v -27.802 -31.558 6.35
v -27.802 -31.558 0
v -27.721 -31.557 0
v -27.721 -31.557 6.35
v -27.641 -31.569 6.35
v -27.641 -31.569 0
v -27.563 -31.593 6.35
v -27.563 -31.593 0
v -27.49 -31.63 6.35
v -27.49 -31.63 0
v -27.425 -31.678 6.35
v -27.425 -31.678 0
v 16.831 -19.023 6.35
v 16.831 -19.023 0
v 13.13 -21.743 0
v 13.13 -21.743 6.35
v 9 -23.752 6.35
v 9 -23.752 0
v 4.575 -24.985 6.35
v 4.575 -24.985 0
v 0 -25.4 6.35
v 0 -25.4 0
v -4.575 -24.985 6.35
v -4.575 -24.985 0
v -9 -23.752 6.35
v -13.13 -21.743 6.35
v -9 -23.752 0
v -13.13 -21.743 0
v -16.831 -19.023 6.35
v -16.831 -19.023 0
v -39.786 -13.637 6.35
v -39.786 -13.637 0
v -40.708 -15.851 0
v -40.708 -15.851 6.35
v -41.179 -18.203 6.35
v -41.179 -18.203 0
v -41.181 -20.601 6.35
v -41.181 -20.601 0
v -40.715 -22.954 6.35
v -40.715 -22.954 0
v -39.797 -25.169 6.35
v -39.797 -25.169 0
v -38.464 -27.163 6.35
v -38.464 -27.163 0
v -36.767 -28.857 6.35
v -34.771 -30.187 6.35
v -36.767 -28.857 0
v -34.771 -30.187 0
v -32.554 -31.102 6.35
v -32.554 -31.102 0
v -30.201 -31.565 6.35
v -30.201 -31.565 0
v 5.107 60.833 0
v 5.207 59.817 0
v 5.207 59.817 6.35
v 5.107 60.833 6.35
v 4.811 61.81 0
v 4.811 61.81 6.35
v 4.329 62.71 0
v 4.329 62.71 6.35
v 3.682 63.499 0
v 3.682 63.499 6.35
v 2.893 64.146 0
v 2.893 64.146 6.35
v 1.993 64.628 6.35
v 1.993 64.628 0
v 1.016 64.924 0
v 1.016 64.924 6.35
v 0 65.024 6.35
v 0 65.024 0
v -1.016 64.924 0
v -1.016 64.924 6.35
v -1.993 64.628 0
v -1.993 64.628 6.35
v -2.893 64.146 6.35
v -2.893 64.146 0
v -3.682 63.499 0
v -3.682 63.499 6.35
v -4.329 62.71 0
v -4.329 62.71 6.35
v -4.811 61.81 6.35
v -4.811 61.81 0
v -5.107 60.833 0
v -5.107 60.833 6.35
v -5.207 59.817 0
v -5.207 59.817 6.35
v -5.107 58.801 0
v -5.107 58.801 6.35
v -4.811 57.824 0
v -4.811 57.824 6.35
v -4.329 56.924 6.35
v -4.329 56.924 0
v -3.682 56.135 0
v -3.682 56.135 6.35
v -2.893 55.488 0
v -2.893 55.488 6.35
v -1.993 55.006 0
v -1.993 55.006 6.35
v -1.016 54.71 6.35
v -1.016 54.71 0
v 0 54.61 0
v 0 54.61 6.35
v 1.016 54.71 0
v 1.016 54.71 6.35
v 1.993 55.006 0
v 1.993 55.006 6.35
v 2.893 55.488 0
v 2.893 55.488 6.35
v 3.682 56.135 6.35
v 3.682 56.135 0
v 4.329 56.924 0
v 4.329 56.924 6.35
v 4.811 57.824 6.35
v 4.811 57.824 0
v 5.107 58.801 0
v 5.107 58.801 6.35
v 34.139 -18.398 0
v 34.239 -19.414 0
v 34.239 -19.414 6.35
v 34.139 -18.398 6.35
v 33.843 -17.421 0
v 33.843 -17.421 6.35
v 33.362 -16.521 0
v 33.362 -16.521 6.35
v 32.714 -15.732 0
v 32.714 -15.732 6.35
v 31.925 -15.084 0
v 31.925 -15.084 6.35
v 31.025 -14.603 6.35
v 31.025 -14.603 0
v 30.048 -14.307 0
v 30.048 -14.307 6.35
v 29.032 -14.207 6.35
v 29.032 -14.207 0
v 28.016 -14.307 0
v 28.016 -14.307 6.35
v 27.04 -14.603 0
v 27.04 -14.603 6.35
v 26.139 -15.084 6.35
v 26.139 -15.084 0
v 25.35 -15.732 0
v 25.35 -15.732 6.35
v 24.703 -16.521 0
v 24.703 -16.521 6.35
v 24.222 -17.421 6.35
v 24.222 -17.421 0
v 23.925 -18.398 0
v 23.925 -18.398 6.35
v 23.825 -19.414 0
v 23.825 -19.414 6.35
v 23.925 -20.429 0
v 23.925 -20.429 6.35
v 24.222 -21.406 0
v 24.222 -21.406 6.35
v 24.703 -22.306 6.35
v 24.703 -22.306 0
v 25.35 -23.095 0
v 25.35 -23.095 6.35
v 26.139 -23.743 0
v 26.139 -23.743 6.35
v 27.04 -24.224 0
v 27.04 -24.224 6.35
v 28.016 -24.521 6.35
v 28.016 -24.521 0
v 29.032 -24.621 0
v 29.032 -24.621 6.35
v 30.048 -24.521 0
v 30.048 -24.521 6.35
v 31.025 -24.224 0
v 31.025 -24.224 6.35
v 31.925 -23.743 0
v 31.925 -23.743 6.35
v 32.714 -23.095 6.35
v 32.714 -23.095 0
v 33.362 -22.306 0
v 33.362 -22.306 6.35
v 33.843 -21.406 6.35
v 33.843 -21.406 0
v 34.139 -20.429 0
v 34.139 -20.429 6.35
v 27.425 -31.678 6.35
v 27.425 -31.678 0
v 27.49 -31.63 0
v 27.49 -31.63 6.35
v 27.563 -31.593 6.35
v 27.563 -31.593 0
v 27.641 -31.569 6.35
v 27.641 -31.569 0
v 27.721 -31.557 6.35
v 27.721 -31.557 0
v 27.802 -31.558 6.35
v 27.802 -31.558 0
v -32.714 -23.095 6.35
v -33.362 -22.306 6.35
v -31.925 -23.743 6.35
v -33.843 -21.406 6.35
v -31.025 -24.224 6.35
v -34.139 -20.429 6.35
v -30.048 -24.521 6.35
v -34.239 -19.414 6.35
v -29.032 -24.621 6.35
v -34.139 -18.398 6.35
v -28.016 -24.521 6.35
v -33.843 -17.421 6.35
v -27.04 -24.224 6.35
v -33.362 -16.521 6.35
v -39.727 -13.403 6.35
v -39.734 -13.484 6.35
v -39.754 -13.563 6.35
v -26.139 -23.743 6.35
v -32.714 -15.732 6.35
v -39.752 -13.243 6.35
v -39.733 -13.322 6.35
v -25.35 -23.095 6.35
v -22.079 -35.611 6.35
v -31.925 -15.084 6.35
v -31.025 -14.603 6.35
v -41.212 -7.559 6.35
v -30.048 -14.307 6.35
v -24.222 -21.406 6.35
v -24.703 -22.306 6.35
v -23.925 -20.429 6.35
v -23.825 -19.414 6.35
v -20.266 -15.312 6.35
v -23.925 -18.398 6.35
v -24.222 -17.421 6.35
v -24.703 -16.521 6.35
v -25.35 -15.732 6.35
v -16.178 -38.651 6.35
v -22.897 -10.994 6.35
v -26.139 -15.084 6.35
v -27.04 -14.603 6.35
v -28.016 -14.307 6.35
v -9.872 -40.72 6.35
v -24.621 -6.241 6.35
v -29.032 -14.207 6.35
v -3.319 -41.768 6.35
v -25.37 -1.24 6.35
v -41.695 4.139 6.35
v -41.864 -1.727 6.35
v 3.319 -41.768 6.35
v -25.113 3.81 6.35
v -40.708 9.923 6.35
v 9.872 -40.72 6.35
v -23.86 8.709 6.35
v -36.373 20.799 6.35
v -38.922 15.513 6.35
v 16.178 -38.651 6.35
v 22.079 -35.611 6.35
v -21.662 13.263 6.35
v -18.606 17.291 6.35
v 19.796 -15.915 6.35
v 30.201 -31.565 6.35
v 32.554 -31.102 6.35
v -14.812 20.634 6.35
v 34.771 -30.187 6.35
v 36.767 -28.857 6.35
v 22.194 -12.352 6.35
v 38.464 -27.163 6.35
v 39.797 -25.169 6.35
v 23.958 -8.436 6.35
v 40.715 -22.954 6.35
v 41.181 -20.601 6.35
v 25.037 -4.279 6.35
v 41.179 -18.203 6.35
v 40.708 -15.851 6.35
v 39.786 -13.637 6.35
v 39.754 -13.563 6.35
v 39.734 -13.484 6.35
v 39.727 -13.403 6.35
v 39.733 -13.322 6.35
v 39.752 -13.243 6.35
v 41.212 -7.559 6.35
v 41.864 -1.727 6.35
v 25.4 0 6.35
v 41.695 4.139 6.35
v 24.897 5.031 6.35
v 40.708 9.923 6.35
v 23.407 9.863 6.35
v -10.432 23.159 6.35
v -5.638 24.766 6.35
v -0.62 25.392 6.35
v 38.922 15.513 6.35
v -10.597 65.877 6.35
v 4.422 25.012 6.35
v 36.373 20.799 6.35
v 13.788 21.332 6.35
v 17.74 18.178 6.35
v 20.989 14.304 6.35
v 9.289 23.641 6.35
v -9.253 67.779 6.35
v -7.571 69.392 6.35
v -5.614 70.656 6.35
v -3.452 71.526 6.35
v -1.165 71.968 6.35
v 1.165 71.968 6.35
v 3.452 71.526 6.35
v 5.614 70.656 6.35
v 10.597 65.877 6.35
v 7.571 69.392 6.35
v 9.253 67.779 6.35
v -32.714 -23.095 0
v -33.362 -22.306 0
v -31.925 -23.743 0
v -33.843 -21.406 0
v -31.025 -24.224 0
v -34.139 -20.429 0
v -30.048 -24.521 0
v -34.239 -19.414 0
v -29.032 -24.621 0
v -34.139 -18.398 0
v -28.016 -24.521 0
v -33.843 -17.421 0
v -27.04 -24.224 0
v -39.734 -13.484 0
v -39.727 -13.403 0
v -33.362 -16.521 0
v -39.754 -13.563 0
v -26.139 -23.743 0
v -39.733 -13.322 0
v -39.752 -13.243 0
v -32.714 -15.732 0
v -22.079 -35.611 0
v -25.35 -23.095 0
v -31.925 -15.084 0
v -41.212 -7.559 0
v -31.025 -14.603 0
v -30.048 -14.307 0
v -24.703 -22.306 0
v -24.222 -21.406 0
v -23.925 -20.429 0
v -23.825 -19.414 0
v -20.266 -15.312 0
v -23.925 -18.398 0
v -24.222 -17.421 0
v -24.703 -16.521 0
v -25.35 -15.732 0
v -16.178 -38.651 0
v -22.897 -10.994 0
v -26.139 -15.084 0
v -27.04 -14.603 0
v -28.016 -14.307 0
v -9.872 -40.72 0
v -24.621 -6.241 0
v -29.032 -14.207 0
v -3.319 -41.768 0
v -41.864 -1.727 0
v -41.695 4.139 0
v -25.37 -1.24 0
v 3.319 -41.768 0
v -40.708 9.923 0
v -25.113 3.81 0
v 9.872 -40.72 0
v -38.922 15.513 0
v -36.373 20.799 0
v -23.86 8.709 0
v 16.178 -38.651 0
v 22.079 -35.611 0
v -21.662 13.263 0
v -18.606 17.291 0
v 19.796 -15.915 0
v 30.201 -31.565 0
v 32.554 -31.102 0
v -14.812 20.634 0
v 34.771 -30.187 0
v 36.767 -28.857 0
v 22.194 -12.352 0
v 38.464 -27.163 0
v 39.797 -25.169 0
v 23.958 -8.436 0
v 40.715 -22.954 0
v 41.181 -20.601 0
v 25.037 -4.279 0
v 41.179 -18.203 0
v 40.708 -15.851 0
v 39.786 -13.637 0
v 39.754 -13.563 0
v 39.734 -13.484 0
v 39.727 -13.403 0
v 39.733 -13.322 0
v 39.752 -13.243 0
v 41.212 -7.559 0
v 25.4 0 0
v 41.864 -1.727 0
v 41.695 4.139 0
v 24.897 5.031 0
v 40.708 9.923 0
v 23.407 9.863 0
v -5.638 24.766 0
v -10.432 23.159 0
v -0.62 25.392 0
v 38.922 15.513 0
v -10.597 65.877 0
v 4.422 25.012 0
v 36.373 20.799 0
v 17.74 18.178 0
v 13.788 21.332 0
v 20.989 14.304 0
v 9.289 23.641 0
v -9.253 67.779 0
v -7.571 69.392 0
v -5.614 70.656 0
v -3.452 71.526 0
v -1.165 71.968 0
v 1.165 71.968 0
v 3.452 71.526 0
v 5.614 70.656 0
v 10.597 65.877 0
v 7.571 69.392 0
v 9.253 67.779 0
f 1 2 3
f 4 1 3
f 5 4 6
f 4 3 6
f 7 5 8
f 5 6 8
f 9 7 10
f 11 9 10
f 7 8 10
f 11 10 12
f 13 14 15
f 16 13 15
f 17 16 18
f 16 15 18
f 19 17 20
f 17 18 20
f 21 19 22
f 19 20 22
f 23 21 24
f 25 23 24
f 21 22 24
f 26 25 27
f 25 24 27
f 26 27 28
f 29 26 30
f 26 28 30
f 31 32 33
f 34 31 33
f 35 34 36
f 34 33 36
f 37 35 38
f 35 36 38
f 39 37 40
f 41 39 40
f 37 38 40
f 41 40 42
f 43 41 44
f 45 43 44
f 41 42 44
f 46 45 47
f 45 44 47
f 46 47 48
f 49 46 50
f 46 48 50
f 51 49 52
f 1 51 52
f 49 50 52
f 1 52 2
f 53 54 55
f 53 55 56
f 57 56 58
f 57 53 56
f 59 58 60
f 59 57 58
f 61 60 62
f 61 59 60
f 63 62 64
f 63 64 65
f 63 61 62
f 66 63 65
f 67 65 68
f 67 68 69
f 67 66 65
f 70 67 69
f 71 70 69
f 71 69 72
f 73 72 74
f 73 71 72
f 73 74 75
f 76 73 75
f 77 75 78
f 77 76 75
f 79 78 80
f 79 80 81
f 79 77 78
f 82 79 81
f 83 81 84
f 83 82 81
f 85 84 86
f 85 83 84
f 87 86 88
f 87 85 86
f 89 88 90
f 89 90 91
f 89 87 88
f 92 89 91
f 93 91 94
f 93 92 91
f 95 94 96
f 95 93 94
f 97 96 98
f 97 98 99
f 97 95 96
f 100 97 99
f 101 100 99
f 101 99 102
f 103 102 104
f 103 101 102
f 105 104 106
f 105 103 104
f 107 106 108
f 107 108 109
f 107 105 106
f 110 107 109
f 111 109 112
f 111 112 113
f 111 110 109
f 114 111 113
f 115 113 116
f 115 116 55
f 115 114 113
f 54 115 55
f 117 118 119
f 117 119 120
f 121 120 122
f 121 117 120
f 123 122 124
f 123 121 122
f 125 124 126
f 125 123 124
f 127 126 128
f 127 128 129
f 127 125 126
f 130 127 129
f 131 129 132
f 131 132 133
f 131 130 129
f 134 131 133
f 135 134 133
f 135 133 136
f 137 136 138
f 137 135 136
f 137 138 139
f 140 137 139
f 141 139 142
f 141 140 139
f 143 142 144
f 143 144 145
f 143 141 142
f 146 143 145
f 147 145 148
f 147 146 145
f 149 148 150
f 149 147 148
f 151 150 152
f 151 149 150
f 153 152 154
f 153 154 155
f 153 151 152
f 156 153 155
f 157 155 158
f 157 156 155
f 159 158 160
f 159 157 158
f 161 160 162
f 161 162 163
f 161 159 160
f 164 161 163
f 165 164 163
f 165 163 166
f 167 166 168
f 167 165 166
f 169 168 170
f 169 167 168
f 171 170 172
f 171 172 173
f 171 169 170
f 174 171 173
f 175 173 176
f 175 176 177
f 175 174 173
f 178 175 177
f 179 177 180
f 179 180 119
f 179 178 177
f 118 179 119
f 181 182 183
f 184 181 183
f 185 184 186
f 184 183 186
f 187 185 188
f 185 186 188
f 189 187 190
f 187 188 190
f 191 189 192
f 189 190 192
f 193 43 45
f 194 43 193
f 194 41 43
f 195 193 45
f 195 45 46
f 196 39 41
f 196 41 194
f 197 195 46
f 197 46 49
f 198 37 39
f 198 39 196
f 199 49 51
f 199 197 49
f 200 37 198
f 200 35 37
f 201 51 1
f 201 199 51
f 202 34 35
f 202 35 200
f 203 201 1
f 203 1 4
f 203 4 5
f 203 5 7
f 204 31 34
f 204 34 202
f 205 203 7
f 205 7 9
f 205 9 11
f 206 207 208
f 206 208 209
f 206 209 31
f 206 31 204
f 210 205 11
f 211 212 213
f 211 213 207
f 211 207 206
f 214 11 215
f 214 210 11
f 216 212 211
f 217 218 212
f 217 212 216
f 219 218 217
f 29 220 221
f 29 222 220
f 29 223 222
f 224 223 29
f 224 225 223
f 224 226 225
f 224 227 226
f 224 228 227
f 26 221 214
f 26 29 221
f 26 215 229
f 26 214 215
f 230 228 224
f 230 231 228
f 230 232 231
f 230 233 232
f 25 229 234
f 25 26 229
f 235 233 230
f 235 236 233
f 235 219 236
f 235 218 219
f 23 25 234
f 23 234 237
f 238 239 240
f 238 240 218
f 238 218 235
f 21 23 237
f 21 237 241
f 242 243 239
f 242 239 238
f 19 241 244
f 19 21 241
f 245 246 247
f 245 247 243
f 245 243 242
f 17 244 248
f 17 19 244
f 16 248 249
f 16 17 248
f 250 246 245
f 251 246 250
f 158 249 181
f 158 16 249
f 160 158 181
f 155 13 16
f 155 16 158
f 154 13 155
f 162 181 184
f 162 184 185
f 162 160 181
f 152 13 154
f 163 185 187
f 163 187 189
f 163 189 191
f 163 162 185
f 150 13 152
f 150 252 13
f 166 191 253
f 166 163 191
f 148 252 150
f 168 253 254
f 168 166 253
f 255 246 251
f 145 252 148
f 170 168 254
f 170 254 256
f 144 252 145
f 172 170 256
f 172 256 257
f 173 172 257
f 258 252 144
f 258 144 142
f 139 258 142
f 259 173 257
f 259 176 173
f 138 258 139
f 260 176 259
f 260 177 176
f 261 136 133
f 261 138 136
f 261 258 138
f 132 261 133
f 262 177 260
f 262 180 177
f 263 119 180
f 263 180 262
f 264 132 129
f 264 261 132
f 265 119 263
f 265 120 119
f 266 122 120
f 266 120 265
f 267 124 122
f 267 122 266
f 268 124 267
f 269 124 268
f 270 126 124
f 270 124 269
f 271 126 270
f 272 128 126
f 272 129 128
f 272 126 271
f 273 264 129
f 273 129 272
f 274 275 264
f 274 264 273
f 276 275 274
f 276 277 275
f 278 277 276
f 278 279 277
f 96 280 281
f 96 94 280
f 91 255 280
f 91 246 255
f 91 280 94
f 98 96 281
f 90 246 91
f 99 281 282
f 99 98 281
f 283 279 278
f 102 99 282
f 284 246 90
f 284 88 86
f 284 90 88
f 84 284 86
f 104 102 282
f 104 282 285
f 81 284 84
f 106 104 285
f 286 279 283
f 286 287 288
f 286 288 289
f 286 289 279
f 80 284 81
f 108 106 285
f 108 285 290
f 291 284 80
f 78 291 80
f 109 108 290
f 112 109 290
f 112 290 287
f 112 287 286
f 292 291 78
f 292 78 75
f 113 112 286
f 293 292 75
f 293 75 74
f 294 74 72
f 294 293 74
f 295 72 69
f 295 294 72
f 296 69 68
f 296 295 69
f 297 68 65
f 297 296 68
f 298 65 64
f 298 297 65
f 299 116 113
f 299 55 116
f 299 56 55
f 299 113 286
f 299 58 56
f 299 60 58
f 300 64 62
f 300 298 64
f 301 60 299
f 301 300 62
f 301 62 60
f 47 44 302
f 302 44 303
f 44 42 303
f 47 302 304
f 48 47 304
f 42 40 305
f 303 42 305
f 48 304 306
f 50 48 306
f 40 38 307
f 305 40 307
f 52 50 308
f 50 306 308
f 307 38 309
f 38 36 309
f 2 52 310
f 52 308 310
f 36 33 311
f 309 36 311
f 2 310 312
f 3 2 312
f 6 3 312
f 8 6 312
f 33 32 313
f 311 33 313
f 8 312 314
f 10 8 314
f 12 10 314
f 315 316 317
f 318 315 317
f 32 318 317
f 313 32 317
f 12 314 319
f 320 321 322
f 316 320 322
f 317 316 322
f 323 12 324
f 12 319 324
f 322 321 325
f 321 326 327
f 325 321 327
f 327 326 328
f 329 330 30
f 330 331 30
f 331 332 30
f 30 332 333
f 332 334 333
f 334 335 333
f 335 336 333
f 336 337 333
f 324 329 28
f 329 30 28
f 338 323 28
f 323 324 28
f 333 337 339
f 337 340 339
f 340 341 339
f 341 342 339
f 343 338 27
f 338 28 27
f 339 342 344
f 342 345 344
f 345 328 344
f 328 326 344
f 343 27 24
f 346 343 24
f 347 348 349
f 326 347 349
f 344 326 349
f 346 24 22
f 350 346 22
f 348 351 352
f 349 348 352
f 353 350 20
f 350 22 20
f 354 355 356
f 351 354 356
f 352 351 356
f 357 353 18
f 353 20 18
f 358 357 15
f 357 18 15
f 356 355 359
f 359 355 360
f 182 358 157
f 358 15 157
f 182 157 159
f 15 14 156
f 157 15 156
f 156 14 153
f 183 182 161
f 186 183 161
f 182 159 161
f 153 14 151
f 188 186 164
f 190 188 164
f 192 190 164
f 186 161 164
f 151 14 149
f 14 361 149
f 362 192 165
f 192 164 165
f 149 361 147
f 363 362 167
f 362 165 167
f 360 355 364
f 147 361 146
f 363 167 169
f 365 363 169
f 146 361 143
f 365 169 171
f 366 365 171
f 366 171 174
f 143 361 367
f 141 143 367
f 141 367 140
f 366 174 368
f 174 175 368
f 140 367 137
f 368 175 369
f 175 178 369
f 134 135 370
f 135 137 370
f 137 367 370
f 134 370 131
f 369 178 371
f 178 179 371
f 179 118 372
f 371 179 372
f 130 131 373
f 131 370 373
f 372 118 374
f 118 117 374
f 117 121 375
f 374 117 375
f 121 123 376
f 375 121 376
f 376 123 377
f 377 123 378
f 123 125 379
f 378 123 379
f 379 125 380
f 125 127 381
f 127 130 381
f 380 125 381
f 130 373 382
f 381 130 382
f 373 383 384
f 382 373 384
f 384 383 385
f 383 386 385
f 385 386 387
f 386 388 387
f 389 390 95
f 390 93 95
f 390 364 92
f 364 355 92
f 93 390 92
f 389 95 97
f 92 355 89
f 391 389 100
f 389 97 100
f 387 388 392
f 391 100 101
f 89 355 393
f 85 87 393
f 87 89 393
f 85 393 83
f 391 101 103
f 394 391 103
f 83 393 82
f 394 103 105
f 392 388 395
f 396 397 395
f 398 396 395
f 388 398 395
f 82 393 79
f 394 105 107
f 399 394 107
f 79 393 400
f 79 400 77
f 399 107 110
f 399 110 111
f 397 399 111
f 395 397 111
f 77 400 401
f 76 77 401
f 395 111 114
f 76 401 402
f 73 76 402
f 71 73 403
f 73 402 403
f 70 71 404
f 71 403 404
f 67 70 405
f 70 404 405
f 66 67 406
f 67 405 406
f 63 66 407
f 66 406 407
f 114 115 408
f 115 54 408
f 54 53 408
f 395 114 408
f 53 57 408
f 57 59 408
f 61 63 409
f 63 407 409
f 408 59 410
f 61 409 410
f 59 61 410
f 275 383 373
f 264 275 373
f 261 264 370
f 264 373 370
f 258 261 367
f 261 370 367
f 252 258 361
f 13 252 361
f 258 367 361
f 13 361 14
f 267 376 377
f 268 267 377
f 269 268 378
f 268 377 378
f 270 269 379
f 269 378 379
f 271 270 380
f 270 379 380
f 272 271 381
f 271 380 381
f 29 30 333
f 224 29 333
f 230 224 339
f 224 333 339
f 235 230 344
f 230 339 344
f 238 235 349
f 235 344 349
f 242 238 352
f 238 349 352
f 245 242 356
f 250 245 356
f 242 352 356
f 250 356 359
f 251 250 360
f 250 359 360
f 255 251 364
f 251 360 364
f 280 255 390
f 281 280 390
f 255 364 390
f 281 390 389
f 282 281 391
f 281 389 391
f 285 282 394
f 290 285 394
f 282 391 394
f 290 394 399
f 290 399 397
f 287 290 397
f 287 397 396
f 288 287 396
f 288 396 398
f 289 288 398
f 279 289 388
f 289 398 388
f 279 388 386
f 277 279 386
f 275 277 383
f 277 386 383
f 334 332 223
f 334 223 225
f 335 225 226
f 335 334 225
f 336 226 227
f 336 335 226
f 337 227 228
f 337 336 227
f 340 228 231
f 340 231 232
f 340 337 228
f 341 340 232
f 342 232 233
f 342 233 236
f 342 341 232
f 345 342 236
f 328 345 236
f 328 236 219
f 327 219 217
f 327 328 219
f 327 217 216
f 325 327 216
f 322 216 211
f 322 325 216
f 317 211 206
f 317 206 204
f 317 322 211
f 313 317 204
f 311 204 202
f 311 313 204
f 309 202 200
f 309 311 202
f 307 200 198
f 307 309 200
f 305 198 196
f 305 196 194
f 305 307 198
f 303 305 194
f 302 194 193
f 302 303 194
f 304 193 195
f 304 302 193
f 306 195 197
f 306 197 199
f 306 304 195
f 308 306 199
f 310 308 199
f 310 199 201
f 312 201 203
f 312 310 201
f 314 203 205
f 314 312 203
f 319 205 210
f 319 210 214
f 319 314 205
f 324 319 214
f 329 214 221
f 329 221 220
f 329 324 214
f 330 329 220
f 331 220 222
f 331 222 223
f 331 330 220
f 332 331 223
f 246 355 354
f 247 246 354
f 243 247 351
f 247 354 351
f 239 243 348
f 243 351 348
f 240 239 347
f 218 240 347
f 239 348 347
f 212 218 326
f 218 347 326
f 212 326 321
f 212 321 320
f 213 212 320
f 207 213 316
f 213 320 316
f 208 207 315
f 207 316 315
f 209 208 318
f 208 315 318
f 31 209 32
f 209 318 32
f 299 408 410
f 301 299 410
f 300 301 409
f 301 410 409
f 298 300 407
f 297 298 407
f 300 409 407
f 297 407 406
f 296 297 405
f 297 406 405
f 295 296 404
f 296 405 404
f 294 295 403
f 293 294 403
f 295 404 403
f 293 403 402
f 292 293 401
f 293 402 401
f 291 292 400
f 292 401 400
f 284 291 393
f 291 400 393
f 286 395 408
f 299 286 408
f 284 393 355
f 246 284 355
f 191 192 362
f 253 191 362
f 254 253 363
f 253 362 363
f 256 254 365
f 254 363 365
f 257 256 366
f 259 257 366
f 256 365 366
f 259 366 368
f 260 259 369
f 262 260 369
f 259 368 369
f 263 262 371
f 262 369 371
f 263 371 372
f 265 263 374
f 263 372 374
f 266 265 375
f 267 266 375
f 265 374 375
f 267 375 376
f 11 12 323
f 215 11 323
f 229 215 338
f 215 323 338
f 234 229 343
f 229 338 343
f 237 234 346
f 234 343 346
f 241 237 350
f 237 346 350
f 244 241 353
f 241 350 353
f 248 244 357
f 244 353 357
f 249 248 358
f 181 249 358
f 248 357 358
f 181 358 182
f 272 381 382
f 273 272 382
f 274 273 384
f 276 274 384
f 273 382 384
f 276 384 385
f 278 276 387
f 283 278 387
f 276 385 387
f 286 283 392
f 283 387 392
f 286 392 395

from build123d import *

# Parameters (mm, degrees)
F0_R     = 5.207
F1_DEPTH = 6.35


with BuildPart() as f1:
    # F0 (on Top) → F1 (new body)
    with BuildSketch(Plane.XY):
        with BuildLine():
            Line((36.373199, 20.799049), (10.596841, 65.876522))
            ThreePointArc((10.596841, 65.876522), (0, 72.024), (-10.596841, 65.876522))
            Line((-10.596841, 65.876522), (-36.373199, 20.799049))
            ThreePointArc((-36.373199, 20.799049), (-41.695098, 4.138692), (-39.75222, -13.242772))
            ThreePointArc((-39.75222, -13.242772), (-39.728424, -13.443582), (-39.786109, -13.637394))
            ThreePointArc((-39.786109, -13.637394), (-39.179546, -26.199019), (-27.802439, -31.558475))
            ThreePointArc((-27.802439, -31.558475), (-27.60129, -31.579207), (-27.424803, -31.677913))
            ThreePointArc((-27.424803, -31.677913), (0, -41.9), (27.424803, -31.677913))
            ThreePointArc((27.424803, -31.677913), (27.60129, -31.579207), (27.802439, -31.558475))
            ThreePointArc((27.802439, -31.558475), (39.179546, -26.199019), (39.786109, -13.637394))
            ThreePointArc((39.786109, -13.637394), (39.728424, -13.443582), (39.75222, -13.242772))
            ThreePointArc((39.75222, -13.242772), (41.695098, 4.138692), (36.373199, 20.799049))
        make_face()
        with Locations((-29.0322, -19.413577)):
            Circle(F0_R, mode=Mode.SUBTRACT)
        with Locations((29.0322, -19.413577)):
            Circle(F0_R, mode=Mode.SUBTRACT)
        with BuildLine():
            ThreePointArc((-16.831461, -19.022669), (-10.431704, 23.159006), (25.4, 0))
            ThreePointArc((25.4, 0), (23.159006, -10.431704), (16.831461, -19.022669))
            ThreePointArc((16.831461, -19.022669), (0, -25.4), (-16.831461, -19.022669))
        make_face(mode=Mode.SUBTRACT)
        with Locations((0, 59.817)):
            Circle(F0_R, mode=Mode.SUBTRACT)
    extrude(amount=F1_DEPTH)


solid = f1.part
